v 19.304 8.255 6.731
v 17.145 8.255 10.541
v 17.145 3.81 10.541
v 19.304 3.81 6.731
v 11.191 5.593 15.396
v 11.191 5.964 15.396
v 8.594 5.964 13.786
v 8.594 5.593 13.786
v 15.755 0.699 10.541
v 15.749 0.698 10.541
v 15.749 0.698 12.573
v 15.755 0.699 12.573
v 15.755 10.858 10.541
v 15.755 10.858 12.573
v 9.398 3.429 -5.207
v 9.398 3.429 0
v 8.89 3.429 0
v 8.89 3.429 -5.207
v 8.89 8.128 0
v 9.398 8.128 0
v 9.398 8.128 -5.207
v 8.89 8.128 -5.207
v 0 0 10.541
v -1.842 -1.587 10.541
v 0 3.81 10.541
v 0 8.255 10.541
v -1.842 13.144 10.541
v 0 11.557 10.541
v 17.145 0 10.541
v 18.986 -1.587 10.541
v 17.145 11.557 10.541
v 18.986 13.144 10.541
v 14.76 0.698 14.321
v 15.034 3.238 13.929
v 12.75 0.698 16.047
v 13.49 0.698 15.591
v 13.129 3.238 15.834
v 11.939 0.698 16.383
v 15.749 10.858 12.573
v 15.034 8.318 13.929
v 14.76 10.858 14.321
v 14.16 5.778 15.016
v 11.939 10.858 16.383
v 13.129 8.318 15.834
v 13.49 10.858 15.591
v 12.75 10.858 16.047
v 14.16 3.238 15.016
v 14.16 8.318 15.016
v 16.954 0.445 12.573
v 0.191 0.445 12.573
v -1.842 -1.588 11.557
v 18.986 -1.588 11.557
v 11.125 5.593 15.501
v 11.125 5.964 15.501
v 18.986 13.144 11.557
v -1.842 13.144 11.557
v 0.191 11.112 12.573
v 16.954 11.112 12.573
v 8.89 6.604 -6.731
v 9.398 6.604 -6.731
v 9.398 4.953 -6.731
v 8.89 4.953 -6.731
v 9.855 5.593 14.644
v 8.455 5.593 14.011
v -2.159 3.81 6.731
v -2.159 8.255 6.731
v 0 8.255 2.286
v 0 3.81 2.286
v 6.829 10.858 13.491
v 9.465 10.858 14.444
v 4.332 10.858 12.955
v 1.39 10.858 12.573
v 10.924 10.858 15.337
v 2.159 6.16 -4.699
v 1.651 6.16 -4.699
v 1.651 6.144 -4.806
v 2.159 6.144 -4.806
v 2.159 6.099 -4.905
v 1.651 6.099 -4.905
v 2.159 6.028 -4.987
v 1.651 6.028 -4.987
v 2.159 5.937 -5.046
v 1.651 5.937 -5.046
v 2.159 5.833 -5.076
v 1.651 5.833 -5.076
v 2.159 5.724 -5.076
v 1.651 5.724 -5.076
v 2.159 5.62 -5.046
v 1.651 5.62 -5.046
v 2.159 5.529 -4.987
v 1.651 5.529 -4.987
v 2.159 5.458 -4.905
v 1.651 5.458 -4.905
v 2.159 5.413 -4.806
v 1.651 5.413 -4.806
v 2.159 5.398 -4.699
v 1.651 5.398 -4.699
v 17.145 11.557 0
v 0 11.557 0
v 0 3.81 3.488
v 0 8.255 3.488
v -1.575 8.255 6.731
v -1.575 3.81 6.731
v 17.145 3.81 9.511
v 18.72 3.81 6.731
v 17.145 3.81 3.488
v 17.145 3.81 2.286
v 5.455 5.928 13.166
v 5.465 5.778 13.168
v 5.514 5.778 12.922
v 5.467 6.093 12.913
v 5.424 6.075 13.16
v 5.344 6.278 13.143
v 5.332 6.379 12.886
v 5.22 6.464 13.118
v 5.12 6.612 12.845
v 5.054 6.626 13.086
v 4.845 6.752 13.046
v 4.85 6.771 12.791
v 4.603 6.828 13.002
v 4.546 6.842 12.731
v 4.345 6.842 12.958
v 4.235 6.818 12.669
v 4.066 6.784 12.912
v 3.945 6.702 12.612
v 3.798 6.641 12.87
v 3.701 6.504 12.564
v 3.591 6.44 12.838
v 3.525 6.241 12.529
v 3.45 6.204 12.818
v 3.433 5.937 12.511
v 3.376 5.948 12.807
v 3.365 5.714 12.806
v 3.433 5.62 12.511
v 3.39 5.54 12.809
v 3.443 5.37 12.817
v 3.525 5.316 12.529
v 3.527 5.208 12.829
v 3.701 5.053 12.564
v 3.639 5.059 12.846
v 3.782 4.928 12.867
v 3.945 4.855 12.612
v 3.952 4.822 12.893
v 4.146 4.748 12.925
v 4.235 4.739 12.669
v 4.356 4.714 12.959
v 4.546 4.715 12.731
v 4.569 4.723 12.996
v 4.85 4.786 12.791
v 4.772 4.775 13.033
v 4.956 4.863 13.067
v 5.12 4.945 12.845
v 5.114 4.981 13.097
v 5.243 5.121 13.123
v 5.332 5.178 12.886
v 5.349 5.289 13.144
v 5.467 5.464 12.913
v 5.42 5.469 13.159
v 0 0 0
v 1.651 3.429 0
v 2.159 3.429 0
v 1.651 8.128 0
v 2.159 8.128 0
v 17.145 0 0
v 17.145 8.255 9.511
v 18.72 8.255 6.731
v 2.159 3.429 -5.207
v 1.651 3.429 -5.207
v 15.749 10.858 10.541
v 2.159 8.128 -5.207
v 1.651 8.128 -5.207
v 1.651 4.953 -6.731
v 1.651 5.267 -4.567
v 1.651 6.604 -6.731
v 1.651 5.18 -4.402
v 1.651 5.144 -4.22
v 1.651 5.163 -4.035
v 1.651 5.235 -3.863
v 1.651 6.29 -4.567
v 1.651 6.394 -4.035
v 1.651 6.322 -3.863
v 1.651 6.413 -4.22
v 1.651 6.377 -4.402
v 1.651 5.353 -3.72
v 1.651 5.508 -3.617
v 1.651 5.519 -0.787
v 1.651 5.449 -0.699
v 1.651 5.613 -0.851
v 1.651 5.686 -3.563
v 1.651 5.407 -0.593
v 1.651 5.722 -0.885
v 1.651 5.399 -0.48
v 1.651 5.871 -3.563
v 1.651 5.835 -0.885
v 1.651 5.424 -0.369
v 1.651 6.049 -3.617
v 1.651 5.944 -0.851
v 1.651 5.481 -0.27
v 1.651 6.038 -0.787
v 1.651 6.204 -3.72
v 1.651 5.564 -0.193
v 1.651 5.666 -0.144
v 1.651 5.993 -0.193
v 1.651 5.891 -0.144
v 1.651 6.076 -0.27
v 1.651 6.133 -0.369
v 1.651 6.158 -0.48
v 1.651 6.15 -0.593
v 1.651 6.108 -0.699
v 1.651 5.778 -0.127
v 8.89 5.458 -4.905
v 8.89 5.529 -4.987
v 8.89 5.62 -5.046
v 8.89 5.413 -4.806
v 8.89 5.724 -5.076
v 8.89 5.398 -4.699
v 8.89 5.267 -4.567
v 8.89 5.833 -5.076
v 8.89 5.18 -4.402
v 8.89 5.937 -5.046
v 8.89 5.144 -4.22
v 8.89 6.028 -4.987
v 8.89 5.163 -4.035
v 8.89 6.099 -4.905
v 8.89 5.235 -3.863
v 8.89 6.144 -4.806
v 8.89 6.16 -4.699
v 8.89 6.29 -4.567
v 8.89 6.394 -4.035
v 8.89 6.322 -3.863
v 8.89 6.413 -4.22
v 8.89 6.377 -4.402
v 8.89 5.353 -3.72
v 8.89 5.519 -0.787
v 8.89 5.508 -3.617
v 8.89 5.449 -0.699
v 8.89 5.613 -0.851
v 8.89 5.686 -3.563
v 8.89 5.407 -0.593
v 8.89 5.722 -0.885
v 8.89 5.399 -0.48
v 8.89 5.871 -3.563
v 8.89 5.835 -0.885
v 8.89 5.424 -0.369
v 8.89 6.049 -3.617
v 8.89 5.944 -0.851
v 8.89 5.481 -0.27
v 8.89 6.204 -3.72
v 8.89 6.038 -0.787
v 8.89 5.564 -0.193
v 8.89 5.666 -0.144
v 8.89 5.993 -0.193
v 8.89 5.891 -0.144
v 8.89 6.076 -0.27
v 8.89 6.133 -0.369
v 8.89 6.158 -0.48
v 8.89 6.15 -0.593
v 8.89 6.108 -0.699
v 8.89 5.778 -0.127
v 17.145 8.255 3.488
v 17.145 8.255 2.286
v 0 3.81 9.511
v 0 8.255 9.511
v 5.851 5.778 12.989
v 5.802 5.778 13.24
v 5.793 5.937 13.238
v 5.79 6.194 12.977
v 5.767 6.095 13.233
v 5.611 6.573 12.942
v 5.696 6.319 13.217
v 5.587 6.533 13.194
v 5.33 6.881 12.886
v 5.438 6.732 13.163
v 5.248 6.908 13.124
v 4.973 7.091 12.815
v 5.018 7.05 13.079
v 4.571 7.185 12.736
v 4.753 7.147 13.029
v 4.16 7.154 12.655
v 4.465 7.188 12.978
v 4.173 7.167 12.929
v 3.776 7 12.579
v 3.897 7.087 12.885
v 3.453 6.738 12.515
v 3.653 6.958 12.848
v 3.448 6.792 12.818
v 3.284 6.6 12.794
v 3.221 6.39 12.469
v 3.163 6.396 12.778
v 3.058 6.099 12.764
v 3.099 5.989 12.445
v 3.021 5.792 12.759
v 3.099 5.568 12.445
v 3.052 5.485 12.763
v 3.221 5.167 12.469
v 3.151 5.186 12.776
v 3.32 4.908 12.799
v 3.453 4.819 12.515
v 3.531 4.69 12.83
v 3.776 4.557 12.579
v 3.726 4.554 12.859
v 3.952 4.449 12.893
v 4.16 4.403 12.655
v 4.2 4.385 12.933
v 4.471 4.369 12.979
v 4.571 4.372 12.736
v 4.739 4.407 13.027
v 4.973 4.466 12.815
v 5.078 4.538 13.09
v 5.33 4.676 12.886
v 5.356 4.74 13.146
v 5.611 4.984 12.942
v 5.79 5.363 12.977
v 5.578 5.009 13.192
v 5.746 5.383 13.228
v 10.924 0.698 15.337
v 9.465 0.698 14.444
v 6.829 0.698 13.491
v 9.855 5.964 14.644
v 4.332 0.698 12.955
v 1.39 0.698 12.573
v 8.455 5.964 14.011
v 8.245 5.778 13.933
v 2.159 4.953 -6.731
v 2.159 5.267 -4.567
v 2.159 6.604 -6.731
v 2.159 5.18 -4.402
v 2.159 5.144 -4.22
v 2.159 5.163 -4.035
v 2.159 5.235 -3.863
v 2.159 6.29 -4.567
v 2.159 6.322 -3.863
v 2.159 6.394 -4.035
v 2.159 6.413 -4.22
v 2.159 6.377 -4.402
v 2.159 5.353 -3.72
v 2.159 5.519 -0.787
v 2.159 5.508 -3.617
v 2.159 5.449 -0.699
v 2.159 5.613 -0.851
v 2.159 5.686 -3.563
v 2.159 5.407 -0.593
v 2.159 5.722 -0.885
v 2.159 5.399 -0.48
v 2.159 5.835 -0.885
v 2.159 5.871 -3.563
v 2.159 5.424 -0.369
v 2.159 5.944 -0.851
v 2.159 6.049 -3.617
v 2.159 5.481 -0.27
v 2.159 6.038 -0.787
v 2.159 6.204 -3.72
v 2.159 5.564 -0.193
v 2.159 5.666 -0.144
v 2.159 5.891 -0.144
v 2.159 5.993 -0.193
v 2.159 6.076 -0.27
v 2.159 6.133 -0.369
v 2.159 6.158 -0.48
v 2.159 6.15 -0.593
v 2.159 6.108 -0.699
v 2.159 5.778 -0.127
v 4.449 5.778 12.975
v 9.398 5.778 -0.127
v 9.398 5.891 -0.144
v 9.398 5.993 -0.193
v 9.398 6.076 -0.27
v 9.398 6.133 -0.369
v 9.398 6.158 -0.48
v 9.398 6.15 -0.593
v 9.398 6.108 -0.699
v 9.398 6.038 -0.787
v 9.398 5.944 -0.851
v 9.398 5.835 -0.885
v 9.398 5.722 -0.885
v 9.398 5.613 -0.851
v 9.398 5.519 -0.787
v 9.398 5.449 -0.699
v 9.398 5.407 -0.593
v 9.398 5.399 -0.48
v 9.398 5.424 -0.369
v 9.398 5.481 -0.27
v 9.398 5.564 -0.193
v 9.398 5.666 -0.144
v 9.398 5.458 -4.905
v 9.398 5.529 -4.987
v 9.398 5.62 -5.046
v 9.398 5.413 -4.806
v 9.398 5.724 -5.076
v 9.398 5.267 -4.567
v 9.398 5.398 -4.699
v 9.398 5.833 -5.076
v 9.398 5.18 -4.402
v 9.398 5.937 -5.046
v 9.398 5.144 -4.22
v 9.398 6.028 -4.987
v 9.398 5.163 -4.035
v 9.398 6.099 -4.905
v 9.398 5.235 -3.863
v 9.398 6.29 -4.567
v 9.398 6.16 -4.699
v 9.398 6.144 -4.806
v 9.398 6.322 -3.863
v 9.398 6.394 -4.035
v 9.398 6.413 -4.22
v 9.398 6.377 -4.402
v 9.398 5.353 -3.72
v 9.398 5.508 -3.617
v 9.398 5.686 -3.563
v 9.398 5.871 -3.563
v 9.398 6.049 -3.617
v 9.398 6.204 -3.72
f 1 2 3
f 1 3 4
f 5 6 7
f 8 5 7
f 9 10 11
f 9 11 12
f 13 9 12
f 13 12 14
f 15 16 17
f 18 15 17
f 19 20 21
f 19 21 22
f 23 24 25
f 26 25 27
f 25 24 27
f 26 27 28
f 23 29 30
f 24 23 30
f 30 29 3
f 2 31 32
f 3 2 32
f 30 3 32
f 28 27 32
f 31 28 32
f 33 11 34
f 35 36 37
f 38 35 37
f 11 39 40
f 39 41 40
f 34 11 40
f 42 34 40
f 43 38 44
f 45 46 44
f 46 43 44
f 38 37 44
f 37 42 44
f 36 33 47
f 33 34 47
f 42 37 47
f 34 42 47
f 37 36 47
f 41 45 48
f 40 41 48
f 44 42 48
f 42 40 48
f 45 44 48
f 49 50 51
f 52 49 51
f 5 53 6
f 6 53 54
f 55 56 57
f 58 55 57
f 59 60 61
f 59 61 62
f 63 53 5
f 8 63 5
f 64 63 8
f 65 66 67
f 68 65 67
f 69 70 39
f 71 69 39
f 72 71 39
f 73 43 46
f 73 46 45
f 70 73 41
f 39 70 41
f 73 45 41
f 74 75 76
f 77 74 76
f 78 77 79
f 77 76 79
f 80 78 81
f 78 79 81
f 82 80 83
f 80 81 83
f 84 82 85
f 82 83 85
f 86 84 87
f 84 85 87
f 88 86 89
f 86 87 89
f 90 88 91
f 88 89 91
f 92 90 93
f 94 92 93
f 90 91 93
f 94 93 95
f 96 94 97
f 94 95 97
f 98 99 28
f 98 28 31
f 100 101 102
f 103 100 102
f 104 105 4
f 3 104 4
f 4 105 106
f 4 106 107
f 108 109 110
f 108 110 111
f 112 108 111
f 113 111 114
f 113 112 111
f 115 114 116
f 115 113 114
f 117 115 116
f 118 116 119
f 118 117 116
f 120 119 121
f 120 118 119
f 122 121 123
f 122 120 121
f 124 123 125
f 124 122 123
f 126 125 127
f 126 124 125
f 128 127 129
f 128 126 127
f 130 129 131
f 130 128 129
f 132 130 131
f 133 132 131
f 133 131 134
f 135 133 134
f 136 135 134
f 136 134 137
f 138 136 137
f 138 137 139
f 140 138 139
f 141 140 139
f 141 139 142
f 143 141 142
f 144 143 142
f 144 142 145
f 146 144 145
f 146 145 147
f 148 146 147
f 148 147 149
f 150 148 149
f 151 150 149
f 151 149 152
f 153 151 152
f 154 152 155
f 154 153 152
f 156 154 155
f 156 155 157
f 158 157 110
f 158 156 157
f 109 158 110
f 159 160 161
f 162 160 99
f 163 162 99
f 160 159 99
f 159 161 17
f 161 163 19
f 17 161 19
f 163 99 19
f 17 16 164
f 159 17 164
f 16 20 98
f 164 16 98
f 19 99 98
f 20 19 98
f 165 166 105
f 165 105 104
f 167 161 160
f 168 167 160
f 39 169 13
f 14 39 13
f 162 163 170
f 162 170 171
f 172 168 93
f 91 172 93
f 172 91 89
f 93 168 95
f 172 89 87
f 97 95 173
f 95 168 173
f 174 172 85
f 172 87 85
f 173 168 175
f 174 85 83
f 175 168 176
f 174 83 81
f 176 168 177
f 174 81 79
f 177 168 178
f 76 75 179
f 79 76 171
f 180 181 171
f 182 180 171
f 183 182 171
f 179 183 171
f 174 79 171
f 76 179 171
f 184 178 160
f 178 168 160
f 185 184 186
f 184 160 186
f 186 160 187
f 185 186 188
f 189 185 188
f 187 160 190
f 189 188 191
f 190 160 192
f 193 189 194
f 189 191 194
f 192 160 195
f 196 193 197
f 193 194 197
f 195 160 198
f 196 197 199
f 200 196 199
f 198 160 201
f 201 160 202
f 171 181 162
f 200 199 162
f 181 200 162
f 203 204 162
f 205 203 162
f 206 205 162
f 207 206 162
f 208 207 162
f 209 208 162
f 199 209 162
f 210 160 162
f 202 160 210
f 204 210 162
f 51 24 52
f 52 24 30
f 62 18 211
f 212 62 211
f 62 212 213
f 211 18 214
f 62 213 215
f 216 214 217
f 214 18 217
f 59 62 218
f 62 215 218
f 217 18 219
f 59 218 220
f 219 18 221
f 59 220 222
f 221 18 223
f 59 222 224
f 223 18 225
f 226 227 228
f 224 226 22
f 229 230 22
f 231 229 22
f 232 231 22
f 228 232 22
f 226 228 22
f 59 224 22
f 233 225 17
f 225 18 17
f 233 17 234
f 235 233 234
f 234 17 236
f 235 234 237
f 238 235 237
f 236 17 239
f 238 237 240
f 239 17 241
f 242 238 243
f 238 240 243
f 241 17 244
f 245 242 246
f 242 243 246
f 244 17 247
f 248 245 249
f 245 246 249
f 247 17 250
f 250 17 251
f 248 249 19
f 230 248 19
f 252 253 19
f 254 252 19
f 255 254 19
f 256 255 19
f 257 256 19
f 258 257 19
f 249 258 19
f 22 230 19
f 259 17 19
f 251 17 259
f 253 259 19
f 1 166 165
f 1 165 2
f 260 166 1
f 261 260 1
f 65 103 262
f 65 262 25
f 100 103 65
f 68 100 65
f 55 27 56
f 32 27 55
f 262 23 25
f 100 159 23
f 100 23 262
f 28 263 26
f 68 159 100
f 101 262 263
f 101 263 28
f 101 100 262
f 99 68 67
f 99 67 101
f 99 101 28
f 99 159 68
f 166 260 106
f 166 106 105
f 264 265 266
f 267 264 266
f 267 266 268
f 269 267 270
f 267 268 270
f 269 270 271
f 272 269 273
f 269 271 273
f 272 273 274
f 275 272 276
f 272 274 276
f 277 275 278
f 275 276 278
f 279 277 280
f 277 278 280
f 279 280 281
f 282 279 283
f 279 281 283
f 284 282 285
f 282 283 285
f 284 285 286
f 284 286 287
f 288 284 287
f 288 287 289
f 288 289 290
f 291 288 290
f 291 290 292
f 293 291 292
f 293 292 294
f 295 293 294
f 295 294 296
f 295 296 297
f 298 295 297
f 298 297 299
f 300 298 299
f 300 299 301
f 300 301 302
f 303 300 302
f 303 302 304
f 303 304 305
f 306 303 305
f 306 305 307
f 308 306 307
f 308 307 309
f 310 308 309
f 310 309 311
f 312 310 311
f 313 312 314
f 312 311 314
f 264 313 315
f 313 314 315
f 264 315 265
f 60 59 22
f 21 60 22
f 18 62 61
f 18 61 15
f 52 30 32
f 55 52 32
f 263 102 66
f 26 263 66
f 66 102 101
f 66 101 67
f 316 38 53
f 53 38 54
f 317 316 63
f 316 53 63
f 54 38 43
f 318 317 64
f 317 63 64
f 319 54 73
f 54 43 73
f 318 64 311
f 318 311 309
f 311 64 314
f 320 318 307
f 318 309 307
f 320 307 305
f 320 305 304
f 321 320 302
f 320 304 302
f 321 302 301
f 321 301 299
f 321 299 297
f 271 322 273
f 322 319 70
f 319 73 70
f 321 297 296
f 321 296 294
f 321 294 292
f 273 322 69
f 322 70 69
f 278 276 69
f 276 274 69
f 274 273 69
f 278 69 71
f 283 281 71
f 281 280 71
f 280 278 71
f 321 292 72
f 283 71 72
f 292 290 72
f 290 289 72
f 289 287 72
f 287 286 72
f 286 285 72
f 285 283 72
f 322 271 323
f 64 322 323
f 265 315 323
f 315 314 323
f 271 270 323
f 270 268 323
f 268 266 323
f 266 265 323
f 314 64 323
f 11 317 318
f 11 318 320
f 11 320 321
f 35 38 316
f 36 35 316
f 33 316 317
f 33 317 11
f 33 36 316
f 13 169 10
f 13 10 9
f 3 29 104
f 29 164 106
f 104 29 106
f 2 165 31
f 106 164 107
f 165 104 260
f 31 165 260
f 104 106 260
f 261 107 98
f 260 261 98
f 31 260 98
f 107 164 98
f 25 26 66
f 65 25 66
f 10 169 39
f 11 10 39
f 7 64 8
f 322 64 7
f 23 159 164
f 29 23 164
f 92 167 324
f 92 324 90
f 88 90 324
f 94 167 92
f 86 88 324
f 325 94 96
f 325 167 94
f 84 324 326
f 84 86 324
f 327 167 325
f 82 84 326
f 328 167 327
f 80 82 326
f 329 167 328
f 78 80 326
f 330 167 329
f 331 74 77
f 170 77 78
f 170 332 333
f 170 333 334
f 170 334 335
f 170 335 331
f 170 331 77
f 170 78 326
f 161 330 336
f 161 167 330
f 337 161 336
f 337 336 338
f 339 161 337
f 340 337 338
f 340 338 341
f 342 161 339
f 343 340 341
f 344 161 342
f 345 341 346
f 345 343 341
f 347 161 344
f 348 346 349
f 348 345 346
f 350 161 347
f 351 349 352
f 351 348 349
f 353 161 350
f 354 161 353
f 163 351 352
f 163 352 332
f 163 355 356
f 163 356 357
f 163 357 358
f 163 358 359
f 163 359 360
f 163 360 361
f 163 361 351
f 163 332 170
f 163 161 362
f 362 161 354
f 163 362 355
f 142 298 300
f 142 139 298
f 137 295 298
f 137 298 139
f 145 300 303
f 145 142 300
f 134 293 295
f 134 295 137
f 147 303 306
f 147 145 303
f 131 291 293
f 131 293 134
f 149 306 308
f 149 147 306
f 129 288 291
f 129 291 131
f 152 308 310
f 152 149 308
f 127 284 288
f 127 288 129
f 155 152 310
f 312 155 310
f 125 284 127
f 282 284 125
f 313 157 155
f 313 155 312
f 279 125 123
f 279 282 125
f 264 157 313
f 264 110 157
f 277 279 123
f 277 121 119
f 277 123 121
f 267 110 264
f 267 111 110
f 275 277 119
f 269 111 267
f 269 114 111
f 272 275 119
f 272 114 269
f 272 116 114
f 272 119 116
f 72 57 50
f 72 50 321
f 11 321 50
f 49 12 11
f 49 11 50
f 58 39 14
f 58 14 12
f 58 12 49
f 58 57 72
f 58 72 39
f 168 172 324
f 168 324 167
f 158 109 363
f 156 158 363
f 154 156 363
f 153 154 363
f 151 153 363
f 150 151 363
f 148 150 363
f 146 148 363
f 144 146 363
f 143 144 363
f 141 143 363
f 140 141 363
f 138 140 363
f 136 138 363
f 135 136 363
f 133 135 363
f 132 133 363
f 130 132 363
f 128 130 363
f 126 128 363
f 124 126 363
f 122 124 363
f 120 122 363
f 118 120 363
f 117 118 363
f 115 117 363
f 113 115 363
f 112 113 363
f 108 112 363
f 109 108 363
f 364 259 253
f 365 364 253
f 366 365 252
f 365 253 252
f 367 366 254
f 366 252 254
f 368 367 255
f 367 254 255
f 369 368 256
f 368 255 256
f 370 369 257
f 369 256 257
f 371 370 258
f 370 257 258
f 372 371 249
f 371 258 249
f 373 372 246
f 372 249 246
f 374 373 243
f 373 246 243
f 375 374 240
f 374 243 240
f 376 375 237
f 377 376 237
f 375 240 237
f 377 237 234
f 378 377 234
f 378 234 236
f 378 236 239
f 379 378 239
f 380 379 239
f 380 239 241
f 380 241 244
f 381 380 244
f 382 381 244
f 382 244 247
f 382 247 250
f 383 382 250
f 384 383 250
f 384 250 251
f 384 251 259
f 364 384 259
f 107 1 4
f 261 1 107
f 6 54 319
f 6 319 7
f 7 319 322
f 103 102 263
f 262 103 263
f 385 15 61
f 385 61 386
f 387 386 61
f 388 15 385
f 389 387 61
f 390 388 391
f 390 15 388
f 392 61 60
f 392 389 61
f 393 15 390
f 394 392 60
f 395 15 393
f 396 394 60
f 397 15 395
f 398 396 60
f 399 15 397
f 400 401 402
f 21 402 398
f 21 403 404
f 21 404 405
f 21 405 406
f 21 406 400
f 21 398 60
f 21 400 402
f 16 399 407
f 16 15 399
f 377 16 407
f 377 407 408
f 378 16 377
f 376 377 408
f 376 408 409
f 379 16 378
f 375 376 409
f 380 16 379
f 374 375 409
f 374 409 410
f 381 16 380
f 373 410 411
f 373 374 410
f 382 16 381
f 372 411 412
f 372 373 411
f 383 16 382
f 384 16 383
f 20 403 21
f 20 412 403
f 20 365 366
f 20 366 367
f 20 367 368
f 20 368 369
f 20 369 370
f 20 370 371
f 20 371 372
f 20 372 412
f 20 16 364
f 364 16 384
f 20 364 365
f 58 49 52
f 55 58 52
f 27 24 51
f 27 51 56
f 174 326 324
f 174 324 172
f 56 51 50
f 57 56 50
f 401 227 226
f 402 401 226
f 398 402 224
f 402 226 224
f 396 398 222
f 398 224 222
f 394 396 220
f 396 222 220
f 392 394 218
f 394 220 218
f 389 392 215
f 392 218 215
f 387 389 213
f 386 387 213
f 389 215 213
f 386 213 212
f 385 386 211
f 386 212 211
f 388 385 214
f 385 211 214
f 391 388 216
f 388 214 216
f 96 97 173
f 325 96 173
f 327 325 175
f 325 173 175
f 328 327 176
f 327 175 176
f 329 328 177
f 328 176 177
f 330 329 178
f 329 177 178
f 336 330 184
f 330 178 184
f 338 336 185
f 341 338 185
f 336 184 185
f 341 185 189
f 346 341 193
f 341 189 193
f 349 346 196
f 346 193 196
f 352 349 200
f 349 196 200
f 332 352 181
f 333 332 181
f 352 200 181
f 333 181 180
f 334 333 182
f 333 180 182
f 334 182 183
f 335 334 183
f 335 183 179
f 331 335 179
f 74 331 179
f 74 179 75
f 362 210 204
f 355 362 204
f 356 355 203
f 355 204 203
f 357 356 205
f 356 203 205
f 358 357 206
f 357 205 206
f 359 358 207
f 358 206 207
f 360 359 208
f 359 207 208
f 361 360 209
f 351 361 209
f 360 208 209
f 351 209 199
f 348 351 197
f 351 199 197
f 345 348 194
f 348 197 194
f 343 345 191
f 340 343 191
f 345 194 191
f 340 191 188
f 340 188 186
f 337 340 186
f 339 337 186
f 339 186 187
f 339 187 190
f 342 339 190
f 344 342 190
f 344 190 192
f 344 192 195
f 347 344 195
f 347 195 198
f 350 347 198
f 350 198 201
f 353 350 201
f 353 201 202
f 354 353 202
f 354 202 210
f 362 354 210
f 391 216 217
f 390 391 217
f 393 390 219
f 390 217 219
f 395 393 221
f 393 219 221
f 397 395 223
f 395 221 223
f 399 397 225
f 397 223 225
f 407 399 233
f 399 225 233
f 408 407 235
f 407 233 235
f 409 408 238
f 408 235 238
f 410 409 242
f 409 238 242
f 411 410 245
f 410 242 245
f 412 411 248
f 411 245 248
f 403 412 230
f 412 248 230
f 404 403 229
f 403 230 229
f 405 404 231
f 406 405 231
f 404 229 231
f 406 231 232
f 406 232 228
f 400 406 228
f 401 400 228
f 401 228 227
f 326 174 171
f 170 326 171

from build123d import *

# Parameters (mm, degrees)
SKETCH1_W           = 17.145
SKETCH1_H           = 11.557
BOSS_EXTRUDE1_DEPTH = 10.541
SKETCH2_W           = 0.508
SKETCH2_H           = 4.699
BOSS_EXTRUDE2_DEPTH = 6.731
CUT_EXTRUDE1_REACH  = 24.017
SKETCH3_R           = 0.381
SKETCH4_W           = 20.828
SKETCH4_H           = 14.732
SKETCH4_W_2         = 14.364137932
SKETCH4_H_2         = 10.16
BOSS_EXTRUDE3_DEPTH = 2.032
CUT_EXTRUDE2_DEPTH  = 28.121934578
CUT_EXTRUDE3_DEPTH  = 28.652554914
BOSS_EXTRUDE4_DEPTH = 10.16
SKETCH8_W           = 3.055360255
SKETCH8_H           = 0.37050197
CUT_EXTRUDE4_DEPTH  = 0.4445
SKETCH9_R           = 1.410409678
SKETCH9_R_2         = 1.066337698
CUT_EXTRUDE5_DEPTH  = 0.4572
BOSS_EXTRUDE5_DEPTH = 4.445


with BuildPart() as part:
    # Sketch1 → Boss-Extrude1 (new body)
    with BuildSketch(Plane.XY):
        with Locations((8.5725, 5.7785)):
            Rectangle(SKETCH1_W, SKETCH1_H)
    extrude(amount=BOSS_EXTRUDE1_DEPTH)

    # Sketch2 → Boss-Extrude2 (add)
    with BuildSketch(Plane(origin=(0, 0, 0), x_dir=(-1, 0, 0), z_dir=(0, 0, -1))):
        with Locations((-1.905, 5.7785)):
            Rectangle(SKETCH2_W, SKETCH2_H)
        with Locations((-9.144, 5.7785)):
            Rectangle(SKETCH2_W, SKETCH2_H)
    extrude(amount=BOSS_EXTRUDE2_DEPTH)

    # Cut-Extrude1: up to this face of the body (flat: up to its plane)
    cut_extrude1_end = Plane(part.part.faces().sort_by_distance((9.398, 5.7785, -3.3655))[0])
    # Sketch3 → Cut-Extrude1 (cut, up to the picked face)
    with BuildSketch(Plane.ZY.offset(-1.651), mode=Mode.PRIVATE) as cut_extrude1_sk1:
        with Locations((-0.508, 5.7785)):
            Circle(SKETCH3_R)
    cut_extrude1_tool1 = split(extrude(cut_extrude1_sk1.sketch, amount=-CUT_EXTRUDE1_REACH, mode=Mode.PRIVATE), bisect_by=cut_extrude1_end, keep=Keep.BOTH, mode=Mode.PRIVATE)
    # Sketch3 → Cut-Extrude1 (cut, up to the picked face)
    with BuildSketch(Plane.ZY.offset(-1.651), mode=Mode.PRIVATE) as cut_extrude1_sk2:
        Polygon((-6.731, 6.604), (-5.207, 8.128), (-6.731, 8.128), align=None)
    cut_extrude1_tool2 = split(extrude(cut_extrude1_sk2.sketch, amount=-CUT_EXTRUDE1_REACH, mode=Mode.PRIVATE), bisect_by=cut_extrude1_end, keep=Keep.BOTH, mode=Mode.PRIVATE)
    # Sketch3 → Cut-Extrude1 (cut, up to the picked face)
    with BuildSketch(Plane.ZY.offset(-1.651), mode=Mode.PRIVATE) as cut_extrude1_sk3:
        Polygon((-6.731, 4.953), (-5.207, 3.429), (-6.731, 3.429), align=None)
    cut_extrude1_tool3 = split(extrude(cut_extrude1_sk3.sketch, amount=-CUT_EXTRUDE1_REACH, mode=Mode.PRIVATE), bisect_by=cut_extrude1_end, keep=Keep.BOTH, mode=Mode.PRIVATE)
    # Sketch3 → Cut-Extrude1 (cut, up to the picked face)
    with BuildSketch(Plane.ZY.offset(-1.651), mode=Mode.PRIVATE) as cut_extrude1_sk4:
        with BuildLine():
            ThreePointArc((-4.699, 5.3975), (-3.556, 5.7785), (-4.699, 6.1595))
            ThreePointArc((-4.699, 6.1595), (-5.08, 5.7785), (-4.699, 5.3975))
        make_face()
    cut_extrude1_tool4 = split(extrude(cut_extrude1_sk4.sketch, amount=-CUT_EXTRUDE1_REACH, mode=Mode.PRIVATE), bisect_by=cut_extrude1_end, keep=Keep.BOTH, mode=Mode.PRIVATE)
    add(cut_extrude1_tool1.solids().sort_by(Axis((1.651, 5.7785, -0.508), (1, 0, 0)))[0], mode=Mode.SUBTRACT)
    add(cut_extrude1_tool2.solids().sort_by(Axis((1.651, 7.62, -6.223), (1, 0, 0)))[0], mode=Mode.SUBTRACT)
    add(cut_extrude1_tool3.solids().sort_by(Axis((1.651, 3.937, -6.223), (1, 0, 0)))[0], mode=Mode.SUBTRACT)
    add(cut_extrude1_tool4.solids().sort_by(Axis((1.651, 5.7785, -4.272067), (1, 0, 0)))[0], mode=Mode.SUBTRACT)

    # Sketch4 → Boss-Extrude3 (add)
    with BuildSketch(Plane.XY.offset(10.541)):
        with Locations((8.5725, 5.7785)):
            Rectangle(SKETCH4_W, SKETCH4_H)
        with Locations((8.5725, 5.7785)):
            Rectangle(SKETCH4_W_2, SKETCH4_H_2, mode=Mode.SUBTRACT)
    extrude(amount=BOSS_EXTRUDE3_DEPTH)

    # Sketch5 → Cut-Extrude2 (cut, through all)
    with BuildSketch(Plane.XZ.offset(1.5875)):
        Polygon((-1.8415, 11.557), (0.1905, 12.573), (-1.8415, 12.573), align=None)
        Polygon((16.9545, 12.573), (18.9865, 11.557), (18.9865, 12.573), align=None)
    extrude(amount=-CUT_EXTRUDE2_DEPTH, mode=Mode.SUBTRACT)

    # Sketch6 → Cut-Extrude3 (cut, through all)
    with BuildSketch(Plane(origin=(18.9865, 0, 0), x_dir=(0, 0, -1), z_dir=(1, 0, 0))):
        Polygon((-11.557, 13.1445), (-12.573, 11.1125), (-12.573, 13.1445), align=None)
        Polygon((-11.557, -1.5875), (-12.573, -1.5875), (-12.573, 0.4445), align=None)
    extrude(amount=-CUT_EXTRUDE3_DEPTH, mode=Mode.SUBTRACT)

    # Sketch7 → Boss-Extrude4 (add)
    with BuildSketch(Plane.XZ.offset(-10.8585)):
        with BuildLine():
            Line((15.749219614, 10.541), (15.749219614, 12.573))
            add(Edge.make_bspline(
                [(15.749219614, 12.573), (14.476637744, 15.554000954), (11.939219614, 16.383)],
                knots=[0, 0, 0, 1, 1, 1], degree=2))
            add(Edge.make_bspline(
                [(11.939219614, 16.383), (9.824691935, 13.388087839), (1.390431034, 12.573)],
                knots=[0, 0, 0, 1, 1, 1], degree=2))
            Line((1.390431034, 12.573), (1.390431034, 10.541))
            Line((1.390431034, 10.541), (15.749219614, 10.541))
        make_face()
    extrude(amount=BOSS_EXTRUDE4_DEPTH)

    # Sketch8 → Cut-Extrude4 (cut)
    with BuildSketch(Plane(origin=(-4.022149692, 0, 6.488075329), x_dir=(-0.8499295023207375, 0, -0.5268964234883585), z_dir=(0.5268964234883585, 0, -0.8499295023207375))):
        with Locations((-16.095593607, 5.7785)):
            Rectangle(SKETCH8_W, SKETCH8_H)
    extrude(amount=CUT_EXTRUDE4_DEPTH, mode=Mode.SUBTRACT)

    # Sketch9 → Cut-Extrude5 (cut)
    with BuildSketch(Plane(origin=(-2.340608329, 0, 11.835119688), x_dir=(0.9809994846940211, 0, 0.1940103374309346), z_dir=(-0.1940103374309346, 0, 0.9809994846940211))):
        with Locations((6.849694399, 5.7785)):
            Circle(SKETCH9_R)
        with Locations((6.849694399, 5.7785)):
            Circle(SKETCH9_R_2, mode=Mode.SUBTRACT)
    extrude(amount=-CUT_EXTRUDE5_DEPTH, mode=Mode.SUBTRACT)

    # Sketch10 → Boss-Extrude5 (add)
    with BuildSketch(Plane(origin=(0, 8.255, 0), x_dir=(1, 0, 0), z_dir=(0, 1, 0))):
        Polygon((0, -10.541), (-2.159, -6.731), (0, -2.286), (0, -3.488132969), (-1.575106844, -6.731), (0, -9.510600313), align=None)
    boss_extrude5 = extrude(amount=-BOSS_EXTRUDE5_DEPTH)

    # Mirror1: Boss-Extrude5 across plane
    add(boss_extrude5.mirror(Plane(origin=(8.5725, 0, 0), x_dir=(0, 0, 1), z_dir=(1, 0, 0))))


solid = part.part
